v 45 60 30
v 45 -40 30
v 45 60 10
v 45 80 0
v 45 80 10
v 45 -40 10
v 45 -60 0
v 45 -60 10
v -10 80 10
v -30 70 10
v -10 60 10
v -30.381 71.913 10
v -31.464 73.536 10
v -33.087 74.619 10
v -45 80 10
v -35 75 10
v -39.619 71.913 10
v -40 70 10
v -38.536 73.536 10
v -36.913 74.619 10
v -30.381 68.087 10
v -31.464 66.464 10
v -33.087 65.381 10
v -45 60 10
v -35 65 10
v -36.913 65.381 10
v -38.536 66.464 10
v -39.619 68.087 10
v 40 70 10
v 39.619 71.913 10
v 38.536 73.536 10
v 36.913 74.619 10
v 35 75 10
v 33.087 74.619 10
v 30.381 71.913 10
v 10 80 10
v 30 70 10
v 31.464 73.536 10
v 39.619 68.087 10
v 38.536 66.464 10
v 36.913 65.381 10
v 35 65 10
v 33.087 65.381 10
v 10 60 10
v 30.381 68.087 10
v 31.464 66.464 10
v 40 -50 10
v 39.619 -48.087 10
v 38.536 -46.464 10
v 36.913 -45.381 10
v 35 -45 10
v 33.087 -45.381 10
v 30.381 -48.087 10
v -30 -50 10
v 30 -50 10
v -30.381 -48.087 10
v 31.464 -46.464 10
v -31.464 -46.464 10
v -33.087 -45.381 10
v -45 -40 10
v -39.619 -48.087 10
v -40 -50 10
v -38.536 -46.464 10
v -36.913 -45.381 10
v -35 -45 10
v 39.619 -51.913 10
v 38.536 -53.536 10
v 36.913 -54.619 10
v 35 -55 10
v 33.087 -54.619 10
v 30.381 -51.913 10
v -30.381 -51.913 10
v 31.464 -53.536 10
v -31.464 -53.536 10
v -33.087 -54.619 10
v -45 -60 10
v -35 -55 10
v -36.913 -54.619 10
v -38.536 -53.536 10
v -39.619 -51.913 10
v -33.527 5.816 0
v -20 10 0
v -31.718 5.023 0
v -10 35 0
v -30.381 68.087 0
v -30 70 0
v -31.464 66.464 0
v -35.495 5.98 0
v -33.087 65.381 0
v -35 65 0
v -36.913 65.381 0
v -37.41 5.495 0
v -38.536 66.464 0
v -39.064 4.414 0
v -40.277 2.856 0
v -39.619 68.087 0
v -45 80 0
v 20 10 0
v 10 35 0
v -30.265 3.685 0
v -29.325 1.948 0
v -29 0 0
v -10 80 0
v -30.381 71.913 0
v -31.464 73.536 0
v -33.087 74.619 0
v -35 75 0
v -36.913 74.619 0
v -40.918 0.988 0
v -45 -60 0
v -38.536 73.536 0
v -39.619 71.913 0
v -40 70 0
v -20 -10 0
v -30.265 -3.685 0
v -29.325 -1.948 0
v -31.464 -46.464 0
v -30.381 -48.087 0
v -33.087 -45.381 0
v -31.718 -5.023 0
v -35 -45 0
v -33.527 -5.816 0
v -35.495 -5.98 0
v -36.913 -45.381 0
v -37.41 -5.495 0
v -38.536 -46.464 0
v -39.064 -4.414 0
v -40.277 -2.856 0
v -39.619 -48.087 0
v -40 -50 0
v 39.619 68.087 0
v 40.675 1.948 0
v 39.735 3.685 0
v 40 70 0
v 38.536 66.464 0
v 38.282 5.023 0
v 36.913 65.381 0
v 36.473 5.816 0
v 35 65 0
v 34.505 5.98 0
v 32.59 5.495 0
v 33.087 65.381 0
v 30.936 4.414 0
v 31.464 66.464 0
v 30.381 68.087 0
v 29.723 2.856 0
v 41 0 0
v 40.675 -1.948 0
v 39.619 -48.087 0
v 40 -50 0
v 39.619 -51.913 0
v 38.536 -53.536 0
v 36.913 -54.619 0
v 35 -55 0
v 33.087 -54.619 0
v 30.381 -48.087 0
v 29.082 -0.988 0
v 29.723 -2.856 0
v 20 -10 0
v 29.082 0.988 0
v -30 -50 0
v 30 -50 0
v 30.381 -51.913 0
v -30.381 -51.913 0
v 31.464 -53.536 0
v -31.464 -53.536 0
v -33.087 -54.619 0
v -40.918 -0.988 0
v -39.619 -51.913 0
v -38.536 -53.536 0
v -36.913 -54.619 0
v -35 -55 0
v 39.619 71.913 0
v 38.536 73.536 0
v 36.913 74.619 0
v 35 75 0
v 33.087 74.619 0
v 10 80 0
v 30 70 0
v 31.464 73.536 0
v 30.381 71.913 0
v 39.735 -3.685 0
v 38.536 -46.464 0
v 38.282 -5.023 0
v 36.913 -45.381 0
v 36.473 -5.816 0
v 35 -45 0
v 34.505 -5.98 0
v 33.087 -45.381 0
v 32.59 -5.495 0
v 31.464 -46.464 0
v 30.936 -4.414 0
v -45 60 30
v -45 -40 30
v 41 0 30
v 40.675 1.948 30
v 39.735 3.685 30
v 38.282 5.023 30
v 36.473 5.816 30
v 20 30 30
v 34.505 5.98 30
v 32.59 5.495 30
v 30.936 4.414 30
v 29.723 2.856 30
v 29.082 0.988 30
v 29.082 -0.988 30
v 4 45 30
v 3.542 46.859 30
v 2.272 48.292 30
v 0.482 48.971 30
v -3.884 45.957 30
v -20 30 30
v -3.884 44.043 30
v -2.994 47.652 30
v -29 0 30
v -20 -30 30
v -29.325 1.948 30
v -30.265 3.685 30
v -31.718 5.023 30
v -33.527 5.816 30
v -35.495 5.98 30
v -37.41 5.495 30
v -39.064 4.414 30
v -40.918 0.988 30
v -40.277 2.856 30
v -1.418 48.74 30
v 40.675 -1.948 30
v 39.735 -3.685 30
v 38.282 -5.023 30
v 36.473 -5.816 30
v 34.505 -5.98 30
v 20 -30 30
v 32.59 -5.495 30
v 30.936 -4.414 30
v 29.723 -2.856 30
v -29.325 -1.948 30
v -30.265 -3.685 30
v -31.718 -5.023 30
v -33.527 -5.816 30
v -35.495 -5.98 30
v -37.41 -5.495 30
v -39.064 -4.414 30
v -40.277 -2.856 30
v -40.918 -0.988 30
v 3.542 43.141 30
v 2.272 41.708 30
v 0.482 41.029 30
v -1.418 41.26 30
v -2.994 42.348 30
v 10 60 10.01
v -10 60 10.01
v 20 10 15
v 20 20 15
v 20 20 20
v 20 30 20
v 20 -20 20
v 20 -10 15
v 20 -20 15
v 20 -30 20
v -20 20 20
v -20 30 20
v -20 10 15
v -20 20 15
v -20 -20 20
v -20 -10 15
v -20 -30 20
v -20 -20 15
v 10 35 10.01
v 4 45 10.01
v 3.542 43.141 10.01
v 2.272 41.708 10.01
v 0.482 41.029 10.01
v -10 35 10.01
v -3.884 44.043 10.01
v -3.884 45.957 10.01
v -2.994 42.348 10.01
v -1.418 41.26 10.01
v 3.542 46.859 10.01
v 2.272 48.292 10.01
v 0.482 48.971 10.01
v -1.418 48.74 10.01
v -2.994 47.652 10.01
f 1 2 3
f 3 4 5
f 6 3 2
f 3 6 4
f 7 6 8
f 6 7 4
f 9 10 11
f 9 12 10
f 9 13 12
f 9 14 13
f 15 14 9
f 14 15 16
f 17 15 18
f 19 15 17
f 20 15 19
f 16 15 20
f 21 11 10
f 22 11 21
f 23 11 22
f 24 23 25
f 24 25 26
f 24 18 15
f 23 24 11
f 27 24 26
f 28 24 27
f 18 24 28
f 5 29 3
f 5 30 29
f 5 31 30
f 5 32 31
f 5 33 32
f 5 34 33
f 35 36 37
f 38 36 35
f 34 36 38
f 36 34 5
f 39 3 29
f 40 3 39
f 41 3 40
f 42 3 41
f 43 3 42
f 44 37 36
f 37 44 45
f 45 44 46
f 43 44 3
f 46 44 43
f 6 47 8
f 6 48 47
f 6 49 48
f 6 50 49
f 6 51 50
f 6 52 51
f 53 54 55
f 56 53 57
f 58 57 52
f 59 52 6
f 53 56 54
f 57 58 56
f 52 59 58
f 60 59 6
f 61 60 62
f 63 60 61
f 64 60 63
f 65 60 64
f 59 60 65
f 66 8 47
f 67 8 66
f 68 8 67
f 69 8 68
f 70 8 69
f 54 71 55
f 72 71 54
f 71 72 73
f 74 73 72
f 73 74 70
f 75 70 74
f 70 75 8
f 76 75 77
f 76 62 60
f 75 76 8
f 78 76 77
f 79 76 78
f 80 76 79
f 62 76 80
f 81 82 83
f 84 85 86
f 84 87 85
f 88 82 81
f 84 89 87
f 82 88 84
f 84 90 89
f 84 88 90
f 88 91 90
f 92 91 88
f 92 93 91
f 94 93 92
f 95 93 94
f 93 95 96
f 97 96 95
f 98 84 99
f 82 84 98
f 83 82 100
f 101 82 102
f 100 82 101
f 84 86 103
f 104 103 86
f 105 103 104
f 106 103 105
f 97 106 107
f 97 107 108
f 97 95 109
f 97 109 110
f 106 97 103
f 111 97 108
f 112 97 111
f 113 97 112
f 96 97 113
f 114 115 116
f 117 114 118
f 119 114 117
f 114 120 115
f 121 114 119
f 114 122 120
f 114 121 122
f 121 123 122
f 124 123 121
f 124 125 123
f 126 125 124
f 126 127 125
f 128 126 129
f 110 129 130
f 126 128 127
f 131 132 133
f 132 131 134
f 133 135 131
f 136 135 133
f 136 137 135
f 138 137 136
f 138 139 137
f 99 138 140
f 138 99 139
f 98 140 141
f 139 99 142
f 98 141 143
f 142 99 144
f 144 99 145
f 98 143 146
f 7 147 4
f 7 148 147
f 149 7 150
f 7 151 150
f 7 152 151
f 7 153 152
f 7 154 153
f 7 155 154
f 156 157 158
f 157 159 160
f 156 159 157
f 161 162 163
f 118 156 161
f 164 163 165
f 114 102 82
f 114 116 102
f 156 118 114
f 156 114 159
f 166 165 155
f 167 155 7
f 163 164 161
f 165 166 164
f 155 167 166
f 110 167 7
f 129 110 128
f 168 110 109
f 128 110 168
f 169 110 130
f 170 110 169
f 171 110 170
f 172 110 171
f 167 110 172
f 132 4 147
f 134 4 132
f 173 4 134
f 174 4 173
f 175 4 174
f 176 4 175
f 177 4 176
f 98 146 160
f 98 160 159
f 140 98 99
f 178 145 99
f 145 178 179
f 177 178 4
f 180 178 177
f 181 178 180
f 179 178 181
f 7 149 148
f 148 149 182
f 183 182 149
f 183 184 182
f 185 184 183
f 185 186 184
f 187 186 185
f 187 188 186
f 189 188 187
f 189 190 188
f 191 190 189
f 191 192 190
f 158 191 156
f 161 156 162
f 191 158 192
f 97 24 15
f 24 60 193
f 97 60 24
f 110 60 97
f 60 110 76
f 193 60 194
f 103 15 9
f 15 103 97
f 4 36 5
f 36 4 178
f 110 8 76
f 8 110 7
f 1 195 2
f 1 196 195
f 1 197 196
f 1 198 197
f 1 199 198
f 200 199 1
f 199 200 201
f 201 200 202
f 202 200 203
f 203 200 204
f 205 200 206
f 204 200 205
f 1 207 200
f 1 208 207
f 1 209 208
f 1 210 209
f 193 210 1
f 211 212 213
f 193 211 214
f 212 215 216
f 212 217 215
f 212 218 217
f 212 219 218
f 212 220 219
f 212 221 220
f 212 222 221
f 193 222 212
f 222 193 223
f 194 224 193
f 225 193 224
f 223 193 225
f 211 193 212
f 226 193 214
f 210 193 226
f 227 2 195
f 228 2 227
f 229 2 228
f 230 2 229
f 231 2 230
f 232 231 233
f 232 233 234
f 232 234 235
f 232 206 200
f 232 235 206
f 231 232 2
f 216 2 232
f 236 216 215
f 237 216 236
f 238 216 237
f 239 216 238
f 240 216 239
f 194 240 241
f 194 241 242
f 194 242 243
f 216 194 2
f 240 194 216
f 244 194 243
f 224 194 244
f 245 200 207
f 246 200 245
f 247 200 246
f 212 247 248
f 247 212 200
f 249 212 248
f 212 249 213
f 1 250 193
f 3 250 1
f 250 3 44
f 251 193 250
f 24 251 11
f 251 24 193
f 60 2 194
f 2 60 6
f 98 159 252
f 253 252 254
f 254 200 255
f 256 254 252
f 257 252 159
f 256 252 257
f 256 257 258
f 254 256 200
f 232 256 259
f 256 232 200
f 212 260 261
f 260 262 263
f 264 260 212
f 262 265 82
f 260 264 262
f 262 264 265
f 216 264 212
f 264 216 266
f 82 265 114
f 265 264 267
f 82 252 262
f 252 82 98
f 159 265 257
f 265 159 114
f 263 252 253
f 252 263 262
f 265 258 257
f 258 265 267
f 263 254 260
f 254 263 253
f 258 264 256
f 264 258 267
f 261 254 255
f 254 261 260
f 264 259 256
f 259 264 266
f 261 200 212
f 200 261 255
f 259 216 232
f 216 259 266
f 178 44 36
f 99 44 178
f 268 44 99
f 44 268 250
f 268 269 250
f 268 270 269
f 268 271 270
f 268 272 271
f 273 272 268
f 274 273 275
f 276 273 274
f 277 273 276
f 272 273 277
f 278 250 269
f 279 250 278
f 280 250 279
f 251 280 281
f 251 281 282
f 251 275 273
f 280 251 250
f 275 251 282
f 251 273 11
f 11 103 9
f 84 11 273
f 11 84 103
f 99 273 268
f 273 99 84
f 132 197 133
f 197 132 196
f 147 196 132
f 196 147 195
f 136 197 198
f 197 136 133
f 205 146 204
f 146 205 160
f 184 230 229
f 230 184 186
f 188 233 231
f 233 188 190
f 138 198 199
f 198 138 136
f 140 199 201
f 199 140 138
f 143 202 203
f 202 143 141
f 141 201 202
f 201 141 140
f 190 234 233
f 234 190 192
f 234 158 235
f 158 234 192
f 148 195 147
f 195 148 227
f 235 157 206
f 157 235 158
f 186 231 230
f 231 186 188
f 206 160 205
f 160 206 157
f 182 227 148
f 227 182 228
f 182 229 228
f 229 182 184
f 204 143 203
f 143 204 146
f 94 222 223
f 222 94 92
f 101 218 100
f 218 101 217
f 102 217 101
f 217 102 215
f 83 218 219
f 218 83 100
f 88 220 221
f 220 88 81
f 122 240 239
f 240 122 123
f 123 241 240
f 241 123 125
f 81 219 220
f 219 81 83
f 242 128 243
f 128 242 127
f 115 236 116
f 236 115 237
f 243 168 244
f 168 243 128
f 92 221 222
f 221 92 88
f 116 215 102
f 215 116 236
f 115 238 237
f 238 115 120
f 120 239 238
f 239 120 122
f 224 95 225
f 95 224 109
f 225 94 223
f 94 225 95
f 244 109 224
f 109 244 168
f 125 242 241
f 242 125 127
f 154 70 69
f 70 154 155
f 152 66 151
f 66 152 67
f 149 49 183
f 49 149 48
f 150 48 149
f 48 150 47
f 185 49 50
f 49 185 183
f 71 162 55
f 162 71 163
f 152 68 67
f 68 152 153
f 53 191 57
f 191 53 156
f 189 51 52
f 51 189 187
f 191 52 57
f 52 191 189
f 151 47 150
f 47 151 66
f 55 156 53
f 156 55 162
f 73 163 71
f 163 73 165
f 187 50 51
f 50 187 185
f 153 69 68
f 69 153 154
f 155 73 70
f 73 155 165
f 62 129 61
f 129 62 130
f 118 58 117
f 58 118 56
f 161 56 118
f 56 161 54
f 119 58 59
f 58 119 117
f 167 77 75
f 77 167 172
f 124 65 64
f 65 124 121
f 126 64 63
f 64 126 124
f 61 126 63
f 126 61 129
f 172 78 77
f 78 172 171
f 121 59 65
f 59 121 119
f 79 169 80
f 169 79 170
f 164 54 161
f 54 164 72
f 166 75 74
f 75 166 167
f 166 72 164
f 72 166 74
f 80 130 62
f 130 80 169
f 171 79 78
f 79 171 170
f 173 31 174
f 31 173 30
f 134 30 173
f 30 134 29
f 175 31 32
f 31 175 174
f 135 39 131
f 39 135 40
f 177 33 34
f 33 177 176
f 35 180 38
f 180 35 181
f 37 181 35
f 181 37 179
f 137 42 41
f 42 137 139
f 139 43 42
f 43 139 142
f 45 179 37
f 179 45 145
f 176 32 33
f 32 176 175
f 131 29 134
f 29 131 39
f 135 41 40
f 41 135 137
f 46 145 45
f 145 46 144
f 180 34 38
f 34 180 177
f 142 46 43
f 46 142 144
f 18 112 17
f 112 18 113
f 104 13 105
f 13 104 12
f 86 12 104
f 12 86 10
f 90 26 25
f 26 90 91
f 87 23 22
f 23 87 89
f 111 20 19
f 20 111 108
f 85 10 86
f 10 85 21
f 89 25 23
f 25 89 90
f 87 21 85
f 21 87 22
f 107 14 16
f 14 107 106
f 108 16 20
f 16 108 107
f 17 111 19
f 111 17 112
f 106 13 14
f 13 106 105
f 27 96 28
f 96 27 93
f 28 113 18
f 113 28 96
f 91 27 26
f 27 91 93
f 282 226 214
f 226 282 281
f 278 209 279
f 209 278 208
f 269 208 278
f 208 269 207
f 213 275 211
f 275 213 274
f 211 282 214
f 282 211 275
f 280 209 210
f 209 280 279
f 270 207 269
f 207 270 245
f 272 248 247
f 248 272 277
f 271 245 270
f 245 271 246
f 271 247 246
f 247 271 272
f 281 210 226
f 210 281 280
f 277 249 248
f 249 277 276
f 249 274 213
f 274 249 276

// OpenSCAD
union(){
difference(){
difference(){
difference(){
union(){
translate([-45,-60,0])cube([90,140,10]);
translate([-45,-40,10])cube([90,100,20]);
}
union(){
translate([-20,-10,-1])cube([40,20,17]);
translate([-20,-20,15])cube([40,40,6]);
translate([-20,-30,20])cube([40,60,11]);
}
}
translate([-10,35,-1])cube([20,46,11.01]);
}
union(){
translate([35,0,-1])cylinder(h=40,r=6);
translate([-35,0,-1])cylinder(h=40,r=6);
translate([35,-50,-1])cylinder(h=40,r=5);
translate([-35,-50,-1])cylinder(h=40,r=5);
translate([35,70,-1])cylinder(h=40,r=5);
translate([-35,70,-1])cylinder(h=40,r=5);
translate([0,45,-1])cylinder(h=40,r=4);
}
}
}
